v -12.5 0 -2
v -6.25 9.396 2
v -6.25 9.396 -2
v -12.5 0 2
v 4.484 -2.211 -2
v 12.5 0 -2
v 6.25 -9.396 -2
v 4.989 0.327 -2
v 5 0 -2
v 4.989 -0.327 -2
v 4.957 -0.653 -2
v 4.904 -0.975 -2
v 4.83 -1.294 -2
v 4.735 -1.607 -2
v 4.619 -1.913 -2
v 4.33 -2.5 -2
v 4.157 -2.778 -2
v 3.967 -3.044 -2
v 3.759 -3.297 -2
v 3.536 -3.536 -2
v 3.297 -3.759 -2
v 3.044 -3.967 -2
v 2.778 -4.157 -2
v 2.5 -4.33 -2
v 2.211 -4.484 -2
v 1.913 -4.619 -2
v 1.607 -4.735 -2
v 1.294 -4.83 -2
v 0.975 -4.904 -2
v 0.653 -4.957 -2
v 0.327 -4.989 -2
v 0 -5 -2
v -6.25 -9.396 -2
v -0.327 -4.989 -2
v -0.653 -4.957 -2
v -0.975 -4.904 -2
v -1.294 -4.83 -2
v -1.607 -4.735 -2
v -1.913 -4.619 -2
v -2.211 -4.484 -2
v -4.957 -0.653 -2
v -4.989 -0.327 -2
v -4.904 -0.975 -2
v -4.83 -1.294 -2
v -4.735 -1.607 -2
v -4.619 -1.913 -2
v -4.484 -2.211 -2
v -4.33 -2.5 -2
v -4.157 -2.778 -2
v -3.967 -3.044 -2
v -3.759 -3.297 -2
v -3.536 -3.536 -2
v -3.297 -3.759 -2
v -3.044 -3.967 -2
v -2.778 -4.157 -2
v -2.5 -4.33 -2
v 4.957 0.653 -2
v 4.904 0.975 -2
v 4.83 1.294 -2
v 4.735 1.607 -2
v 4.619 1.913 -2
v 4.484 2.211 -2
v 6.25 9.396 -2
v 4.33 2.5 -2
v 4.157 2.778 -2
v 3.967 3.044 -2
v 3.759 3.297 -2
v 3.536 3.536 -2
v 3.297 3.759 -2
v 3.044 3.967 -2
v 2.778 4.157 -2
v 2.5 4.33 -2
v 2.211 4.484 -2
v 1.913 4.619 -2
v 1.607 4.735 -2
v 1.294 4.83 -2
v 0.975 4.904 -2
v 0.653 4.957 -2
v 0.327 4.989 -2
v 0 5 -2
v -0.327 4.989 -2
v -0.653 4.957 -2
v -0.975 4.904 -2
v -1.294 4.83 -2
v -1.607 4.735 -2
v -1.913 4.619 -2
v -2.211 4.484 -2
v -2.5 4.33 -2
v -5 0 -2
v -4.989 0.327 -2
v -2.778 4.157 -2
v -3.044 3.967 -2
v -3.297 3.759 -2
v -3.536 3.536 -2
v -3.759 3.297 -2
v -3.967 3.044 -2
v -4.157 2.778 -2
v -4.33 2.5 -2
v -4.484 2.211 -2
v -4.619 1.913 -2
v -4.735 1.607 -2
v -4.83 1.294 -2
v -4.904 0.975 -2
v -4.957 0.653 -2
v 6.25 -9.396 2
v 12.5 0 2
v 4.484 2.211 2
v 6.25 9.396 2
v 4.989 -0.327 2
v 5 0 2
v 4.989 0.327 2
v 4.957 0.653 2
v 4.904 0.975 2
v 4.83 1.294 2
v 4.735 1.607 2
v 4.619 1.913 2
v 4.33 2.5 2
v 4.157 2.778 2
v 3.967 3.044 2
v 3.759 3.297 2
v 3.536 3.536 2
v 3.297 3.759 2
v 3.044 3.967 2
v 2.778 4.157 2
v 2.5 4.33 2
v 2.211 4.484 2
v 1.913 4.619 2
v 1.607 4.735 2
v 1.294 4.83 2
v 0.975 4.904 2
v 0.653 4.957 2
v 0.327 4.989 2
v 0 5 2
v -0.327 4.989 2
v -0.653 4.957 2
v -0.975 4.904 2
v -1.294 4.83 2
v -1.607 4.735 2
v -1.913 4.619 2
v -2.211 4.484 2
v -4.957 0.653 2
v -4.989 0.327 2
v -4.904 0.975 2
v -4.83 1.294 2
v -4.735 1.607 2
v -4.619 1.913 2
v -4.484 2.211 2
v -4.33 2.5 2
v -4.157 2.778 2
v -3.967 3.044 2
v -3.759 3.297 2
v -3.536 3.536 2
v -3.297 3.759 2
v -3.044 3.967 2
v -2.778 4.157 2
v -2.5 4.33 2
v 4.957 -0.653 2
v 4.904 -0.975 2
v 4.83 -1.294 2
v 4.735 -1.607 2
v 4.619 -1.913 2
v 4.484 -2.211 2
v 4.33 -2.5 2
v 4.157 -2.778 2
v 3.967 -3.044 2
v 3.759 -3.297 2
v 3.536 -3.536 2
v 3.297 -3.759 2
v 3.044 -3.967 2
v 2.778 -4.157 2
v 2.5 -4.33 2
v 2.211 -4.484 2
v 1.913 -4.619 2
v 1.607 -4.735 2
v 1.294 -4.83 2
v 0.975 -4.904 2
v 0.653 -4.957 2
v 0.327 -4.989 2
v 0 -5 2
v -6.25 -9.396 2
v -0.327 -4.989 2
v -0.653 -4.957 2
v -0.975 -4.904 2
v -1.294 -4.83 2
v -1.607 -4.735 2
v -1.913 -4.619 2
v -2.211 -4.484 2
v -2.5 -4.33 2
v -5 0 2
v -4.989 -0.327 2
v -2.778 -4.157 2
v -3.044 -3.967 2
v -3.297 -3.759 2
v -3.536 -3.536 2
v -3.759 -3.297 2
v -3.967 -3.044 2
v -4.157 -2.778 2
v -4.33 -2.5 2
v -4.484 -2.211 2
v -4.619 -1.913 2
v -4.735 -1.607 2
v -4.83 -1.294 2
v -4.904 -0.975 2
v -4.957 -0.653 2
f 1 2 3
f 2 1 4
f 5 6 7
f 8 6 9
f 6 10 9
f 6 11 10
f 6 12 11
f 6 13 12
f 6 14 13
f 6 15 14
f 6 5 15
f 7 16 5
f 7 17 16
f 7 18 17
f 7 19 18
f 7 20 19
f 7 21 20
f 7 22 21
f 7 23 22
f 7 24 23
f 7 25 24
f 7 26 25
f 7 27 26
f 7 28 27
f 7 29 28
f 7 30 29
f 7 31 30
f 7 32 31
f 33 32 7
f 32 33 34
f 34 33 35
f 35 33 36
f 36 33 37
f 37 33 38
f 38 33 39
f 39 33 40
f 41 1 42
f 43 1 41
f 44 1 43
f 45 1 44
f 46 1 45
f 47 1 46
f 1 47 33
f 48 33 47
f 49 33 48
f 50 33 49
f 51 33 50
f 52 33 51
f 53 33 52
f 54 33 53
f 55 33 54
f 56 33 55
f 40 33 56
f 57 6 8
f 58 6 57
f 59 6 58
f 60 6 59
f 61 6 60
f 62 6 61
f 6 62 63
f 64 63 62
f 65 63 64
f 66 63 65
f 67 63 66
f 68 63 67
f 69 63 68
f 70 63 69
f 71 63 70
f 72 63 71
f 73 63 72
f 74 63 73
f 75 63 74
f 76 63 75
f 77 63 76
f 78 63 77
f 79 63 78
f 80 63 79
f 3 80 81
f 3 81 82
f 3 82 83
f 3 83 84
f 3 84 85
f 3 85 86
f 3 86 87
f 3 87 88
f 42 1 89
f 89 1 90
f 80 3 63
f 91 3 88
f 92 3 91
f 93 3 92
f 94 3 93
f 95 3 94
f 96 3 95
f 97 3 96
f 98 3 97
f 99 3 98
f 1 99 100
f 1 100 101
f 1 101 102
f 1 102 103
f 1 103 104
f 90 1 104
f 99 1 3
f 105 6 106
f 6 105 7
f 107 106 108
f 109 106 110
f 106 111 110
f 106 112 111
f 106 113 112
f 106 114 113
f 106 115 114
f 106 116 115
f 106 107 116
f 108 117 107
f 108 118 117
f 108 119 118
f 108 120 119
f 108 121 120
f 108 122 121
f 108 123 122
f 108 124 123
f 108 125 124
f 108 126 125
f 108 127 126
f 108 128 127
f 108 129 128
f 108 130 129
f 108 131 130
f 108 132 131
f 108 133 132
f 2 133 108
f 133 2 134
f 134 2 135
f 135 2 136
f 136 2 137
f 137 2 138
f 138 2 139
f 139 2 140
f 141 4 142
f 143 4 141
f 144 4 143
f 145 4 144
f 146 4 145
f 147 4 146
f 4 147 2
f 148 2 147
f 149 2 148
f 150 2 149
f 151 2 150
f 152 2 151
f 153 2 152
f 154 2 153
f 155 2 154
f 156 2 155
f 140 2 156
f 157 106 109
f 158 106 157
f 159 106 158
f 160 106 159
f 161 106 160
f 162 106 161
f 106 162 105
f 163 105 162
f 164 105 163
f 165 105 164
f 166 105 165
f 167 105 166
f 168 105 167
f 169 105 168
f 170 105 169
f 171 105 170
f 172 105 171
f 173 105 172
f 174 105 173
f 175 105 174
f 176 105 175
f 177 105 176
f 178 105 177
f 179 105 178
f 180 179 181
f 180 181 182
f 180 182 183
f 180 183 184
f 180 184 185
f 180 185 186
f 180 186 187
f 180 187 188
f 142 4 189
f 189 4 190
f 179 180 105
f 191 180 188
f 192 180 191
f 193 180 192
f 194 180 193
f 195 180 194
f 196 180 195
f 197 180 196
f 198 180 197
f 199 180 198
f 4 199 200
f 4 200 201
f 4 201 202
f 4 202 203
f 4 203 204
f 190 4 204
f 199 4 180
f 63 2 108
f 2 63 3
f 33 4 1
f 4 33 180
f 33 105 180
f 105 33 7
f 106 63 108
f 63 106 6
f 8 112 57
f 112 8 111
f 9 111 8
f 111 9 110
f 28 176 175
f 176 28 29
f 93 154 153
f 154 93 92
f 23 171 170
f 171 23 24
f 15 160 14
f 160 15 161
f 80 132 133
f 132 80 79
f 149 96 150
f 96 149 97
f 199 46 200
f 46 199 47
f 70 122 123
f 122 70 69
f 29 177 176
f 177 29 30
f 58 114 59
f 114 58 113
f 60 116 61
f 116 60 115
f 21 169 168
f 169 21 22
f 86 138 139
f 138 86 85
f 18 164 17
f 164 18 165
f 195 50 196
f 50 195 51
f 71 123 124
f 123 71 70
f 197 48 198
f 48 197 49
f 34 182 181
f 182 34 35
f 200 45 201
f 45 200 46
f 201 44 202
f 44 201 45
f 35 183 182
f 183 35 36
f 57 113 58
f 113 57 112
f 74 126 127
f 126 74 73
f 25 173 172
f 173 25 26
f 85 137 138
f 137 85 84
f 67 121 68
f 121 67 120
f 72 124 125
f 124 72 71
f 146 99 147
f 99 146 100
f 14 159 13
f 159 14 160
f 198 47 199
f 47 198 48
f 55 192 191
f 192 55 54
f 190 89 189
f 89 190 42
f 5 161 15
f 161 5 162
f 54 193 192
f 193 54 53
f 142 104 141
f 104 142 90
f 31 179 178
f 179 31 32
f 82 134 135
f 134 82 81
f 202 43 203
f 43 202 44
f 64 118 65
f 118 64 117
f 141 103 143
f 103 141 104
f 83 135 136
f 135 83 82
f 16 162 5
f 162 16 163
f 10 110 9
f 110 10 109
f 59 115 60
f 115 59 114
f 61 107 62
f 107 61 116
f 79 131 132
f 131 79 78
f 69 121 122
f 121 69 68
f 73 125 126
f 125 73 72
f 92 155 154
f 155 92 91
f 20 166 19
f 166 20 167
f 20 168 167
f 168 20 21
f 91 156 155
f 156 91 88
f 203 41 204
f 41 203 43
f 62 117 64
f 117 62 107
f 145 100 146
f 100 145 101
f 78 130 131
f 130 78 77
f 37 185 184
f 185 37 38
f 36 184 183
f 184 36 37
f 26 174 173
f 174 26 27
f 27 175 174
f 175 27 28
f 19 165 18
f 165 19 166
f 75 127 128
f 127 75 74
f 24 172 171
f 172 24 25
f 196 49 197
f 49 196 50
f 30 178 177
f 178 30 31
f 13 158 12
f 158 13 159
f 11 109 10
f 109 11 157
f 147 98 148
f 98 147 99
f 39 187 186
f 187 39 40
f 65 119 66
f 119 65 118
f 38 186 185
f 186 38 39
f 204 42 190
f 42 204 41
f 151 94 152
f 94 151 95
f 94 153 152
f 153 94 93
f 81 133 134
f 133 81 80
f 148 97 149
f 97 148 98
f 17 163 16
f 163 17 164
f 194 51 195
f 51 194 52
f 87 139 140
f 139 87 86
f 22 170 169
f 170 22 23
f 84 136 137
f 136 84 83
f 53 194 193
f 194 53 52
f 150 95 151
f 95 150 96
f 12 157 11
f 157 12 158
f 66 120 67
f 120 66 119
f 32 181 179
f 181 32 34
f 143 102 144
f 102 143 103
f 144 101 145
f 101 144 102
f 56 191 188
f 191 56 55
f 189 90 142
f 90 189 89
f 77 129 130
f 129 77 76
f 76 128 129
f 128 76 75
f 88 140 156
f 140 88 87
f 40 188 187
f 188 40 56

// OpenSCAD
$fn=96;

outer_x = 25.0;
outer_y = 21.7;
total_h = 4.0;

hole_d = 10.0;

step_h = 1.0;
mid_h = total_h - 2*step_h;

mid_scale = 0.88;

module hex2d(rx, ry){
    scale([rx, ry, 1])
        circle(r=1, $fn=6);
}

module hex_prism(rx, ry, h){
    linear_extrude(height=h, center=true)
        hex2d(rx, ry);
}

module stepped_hex_plate(){
    union(){
        hex_prism(outer_x/2, outer_y/2, total_h);
        hex_prism((outer_x/2)*mid_scale, (outer_y/2)*mid_scale, mid_h);
    }
}

difference(){
    stepped_hex_plate();
    cylinder(h=total_h+0.4, d=hole_d, center=true);
}
